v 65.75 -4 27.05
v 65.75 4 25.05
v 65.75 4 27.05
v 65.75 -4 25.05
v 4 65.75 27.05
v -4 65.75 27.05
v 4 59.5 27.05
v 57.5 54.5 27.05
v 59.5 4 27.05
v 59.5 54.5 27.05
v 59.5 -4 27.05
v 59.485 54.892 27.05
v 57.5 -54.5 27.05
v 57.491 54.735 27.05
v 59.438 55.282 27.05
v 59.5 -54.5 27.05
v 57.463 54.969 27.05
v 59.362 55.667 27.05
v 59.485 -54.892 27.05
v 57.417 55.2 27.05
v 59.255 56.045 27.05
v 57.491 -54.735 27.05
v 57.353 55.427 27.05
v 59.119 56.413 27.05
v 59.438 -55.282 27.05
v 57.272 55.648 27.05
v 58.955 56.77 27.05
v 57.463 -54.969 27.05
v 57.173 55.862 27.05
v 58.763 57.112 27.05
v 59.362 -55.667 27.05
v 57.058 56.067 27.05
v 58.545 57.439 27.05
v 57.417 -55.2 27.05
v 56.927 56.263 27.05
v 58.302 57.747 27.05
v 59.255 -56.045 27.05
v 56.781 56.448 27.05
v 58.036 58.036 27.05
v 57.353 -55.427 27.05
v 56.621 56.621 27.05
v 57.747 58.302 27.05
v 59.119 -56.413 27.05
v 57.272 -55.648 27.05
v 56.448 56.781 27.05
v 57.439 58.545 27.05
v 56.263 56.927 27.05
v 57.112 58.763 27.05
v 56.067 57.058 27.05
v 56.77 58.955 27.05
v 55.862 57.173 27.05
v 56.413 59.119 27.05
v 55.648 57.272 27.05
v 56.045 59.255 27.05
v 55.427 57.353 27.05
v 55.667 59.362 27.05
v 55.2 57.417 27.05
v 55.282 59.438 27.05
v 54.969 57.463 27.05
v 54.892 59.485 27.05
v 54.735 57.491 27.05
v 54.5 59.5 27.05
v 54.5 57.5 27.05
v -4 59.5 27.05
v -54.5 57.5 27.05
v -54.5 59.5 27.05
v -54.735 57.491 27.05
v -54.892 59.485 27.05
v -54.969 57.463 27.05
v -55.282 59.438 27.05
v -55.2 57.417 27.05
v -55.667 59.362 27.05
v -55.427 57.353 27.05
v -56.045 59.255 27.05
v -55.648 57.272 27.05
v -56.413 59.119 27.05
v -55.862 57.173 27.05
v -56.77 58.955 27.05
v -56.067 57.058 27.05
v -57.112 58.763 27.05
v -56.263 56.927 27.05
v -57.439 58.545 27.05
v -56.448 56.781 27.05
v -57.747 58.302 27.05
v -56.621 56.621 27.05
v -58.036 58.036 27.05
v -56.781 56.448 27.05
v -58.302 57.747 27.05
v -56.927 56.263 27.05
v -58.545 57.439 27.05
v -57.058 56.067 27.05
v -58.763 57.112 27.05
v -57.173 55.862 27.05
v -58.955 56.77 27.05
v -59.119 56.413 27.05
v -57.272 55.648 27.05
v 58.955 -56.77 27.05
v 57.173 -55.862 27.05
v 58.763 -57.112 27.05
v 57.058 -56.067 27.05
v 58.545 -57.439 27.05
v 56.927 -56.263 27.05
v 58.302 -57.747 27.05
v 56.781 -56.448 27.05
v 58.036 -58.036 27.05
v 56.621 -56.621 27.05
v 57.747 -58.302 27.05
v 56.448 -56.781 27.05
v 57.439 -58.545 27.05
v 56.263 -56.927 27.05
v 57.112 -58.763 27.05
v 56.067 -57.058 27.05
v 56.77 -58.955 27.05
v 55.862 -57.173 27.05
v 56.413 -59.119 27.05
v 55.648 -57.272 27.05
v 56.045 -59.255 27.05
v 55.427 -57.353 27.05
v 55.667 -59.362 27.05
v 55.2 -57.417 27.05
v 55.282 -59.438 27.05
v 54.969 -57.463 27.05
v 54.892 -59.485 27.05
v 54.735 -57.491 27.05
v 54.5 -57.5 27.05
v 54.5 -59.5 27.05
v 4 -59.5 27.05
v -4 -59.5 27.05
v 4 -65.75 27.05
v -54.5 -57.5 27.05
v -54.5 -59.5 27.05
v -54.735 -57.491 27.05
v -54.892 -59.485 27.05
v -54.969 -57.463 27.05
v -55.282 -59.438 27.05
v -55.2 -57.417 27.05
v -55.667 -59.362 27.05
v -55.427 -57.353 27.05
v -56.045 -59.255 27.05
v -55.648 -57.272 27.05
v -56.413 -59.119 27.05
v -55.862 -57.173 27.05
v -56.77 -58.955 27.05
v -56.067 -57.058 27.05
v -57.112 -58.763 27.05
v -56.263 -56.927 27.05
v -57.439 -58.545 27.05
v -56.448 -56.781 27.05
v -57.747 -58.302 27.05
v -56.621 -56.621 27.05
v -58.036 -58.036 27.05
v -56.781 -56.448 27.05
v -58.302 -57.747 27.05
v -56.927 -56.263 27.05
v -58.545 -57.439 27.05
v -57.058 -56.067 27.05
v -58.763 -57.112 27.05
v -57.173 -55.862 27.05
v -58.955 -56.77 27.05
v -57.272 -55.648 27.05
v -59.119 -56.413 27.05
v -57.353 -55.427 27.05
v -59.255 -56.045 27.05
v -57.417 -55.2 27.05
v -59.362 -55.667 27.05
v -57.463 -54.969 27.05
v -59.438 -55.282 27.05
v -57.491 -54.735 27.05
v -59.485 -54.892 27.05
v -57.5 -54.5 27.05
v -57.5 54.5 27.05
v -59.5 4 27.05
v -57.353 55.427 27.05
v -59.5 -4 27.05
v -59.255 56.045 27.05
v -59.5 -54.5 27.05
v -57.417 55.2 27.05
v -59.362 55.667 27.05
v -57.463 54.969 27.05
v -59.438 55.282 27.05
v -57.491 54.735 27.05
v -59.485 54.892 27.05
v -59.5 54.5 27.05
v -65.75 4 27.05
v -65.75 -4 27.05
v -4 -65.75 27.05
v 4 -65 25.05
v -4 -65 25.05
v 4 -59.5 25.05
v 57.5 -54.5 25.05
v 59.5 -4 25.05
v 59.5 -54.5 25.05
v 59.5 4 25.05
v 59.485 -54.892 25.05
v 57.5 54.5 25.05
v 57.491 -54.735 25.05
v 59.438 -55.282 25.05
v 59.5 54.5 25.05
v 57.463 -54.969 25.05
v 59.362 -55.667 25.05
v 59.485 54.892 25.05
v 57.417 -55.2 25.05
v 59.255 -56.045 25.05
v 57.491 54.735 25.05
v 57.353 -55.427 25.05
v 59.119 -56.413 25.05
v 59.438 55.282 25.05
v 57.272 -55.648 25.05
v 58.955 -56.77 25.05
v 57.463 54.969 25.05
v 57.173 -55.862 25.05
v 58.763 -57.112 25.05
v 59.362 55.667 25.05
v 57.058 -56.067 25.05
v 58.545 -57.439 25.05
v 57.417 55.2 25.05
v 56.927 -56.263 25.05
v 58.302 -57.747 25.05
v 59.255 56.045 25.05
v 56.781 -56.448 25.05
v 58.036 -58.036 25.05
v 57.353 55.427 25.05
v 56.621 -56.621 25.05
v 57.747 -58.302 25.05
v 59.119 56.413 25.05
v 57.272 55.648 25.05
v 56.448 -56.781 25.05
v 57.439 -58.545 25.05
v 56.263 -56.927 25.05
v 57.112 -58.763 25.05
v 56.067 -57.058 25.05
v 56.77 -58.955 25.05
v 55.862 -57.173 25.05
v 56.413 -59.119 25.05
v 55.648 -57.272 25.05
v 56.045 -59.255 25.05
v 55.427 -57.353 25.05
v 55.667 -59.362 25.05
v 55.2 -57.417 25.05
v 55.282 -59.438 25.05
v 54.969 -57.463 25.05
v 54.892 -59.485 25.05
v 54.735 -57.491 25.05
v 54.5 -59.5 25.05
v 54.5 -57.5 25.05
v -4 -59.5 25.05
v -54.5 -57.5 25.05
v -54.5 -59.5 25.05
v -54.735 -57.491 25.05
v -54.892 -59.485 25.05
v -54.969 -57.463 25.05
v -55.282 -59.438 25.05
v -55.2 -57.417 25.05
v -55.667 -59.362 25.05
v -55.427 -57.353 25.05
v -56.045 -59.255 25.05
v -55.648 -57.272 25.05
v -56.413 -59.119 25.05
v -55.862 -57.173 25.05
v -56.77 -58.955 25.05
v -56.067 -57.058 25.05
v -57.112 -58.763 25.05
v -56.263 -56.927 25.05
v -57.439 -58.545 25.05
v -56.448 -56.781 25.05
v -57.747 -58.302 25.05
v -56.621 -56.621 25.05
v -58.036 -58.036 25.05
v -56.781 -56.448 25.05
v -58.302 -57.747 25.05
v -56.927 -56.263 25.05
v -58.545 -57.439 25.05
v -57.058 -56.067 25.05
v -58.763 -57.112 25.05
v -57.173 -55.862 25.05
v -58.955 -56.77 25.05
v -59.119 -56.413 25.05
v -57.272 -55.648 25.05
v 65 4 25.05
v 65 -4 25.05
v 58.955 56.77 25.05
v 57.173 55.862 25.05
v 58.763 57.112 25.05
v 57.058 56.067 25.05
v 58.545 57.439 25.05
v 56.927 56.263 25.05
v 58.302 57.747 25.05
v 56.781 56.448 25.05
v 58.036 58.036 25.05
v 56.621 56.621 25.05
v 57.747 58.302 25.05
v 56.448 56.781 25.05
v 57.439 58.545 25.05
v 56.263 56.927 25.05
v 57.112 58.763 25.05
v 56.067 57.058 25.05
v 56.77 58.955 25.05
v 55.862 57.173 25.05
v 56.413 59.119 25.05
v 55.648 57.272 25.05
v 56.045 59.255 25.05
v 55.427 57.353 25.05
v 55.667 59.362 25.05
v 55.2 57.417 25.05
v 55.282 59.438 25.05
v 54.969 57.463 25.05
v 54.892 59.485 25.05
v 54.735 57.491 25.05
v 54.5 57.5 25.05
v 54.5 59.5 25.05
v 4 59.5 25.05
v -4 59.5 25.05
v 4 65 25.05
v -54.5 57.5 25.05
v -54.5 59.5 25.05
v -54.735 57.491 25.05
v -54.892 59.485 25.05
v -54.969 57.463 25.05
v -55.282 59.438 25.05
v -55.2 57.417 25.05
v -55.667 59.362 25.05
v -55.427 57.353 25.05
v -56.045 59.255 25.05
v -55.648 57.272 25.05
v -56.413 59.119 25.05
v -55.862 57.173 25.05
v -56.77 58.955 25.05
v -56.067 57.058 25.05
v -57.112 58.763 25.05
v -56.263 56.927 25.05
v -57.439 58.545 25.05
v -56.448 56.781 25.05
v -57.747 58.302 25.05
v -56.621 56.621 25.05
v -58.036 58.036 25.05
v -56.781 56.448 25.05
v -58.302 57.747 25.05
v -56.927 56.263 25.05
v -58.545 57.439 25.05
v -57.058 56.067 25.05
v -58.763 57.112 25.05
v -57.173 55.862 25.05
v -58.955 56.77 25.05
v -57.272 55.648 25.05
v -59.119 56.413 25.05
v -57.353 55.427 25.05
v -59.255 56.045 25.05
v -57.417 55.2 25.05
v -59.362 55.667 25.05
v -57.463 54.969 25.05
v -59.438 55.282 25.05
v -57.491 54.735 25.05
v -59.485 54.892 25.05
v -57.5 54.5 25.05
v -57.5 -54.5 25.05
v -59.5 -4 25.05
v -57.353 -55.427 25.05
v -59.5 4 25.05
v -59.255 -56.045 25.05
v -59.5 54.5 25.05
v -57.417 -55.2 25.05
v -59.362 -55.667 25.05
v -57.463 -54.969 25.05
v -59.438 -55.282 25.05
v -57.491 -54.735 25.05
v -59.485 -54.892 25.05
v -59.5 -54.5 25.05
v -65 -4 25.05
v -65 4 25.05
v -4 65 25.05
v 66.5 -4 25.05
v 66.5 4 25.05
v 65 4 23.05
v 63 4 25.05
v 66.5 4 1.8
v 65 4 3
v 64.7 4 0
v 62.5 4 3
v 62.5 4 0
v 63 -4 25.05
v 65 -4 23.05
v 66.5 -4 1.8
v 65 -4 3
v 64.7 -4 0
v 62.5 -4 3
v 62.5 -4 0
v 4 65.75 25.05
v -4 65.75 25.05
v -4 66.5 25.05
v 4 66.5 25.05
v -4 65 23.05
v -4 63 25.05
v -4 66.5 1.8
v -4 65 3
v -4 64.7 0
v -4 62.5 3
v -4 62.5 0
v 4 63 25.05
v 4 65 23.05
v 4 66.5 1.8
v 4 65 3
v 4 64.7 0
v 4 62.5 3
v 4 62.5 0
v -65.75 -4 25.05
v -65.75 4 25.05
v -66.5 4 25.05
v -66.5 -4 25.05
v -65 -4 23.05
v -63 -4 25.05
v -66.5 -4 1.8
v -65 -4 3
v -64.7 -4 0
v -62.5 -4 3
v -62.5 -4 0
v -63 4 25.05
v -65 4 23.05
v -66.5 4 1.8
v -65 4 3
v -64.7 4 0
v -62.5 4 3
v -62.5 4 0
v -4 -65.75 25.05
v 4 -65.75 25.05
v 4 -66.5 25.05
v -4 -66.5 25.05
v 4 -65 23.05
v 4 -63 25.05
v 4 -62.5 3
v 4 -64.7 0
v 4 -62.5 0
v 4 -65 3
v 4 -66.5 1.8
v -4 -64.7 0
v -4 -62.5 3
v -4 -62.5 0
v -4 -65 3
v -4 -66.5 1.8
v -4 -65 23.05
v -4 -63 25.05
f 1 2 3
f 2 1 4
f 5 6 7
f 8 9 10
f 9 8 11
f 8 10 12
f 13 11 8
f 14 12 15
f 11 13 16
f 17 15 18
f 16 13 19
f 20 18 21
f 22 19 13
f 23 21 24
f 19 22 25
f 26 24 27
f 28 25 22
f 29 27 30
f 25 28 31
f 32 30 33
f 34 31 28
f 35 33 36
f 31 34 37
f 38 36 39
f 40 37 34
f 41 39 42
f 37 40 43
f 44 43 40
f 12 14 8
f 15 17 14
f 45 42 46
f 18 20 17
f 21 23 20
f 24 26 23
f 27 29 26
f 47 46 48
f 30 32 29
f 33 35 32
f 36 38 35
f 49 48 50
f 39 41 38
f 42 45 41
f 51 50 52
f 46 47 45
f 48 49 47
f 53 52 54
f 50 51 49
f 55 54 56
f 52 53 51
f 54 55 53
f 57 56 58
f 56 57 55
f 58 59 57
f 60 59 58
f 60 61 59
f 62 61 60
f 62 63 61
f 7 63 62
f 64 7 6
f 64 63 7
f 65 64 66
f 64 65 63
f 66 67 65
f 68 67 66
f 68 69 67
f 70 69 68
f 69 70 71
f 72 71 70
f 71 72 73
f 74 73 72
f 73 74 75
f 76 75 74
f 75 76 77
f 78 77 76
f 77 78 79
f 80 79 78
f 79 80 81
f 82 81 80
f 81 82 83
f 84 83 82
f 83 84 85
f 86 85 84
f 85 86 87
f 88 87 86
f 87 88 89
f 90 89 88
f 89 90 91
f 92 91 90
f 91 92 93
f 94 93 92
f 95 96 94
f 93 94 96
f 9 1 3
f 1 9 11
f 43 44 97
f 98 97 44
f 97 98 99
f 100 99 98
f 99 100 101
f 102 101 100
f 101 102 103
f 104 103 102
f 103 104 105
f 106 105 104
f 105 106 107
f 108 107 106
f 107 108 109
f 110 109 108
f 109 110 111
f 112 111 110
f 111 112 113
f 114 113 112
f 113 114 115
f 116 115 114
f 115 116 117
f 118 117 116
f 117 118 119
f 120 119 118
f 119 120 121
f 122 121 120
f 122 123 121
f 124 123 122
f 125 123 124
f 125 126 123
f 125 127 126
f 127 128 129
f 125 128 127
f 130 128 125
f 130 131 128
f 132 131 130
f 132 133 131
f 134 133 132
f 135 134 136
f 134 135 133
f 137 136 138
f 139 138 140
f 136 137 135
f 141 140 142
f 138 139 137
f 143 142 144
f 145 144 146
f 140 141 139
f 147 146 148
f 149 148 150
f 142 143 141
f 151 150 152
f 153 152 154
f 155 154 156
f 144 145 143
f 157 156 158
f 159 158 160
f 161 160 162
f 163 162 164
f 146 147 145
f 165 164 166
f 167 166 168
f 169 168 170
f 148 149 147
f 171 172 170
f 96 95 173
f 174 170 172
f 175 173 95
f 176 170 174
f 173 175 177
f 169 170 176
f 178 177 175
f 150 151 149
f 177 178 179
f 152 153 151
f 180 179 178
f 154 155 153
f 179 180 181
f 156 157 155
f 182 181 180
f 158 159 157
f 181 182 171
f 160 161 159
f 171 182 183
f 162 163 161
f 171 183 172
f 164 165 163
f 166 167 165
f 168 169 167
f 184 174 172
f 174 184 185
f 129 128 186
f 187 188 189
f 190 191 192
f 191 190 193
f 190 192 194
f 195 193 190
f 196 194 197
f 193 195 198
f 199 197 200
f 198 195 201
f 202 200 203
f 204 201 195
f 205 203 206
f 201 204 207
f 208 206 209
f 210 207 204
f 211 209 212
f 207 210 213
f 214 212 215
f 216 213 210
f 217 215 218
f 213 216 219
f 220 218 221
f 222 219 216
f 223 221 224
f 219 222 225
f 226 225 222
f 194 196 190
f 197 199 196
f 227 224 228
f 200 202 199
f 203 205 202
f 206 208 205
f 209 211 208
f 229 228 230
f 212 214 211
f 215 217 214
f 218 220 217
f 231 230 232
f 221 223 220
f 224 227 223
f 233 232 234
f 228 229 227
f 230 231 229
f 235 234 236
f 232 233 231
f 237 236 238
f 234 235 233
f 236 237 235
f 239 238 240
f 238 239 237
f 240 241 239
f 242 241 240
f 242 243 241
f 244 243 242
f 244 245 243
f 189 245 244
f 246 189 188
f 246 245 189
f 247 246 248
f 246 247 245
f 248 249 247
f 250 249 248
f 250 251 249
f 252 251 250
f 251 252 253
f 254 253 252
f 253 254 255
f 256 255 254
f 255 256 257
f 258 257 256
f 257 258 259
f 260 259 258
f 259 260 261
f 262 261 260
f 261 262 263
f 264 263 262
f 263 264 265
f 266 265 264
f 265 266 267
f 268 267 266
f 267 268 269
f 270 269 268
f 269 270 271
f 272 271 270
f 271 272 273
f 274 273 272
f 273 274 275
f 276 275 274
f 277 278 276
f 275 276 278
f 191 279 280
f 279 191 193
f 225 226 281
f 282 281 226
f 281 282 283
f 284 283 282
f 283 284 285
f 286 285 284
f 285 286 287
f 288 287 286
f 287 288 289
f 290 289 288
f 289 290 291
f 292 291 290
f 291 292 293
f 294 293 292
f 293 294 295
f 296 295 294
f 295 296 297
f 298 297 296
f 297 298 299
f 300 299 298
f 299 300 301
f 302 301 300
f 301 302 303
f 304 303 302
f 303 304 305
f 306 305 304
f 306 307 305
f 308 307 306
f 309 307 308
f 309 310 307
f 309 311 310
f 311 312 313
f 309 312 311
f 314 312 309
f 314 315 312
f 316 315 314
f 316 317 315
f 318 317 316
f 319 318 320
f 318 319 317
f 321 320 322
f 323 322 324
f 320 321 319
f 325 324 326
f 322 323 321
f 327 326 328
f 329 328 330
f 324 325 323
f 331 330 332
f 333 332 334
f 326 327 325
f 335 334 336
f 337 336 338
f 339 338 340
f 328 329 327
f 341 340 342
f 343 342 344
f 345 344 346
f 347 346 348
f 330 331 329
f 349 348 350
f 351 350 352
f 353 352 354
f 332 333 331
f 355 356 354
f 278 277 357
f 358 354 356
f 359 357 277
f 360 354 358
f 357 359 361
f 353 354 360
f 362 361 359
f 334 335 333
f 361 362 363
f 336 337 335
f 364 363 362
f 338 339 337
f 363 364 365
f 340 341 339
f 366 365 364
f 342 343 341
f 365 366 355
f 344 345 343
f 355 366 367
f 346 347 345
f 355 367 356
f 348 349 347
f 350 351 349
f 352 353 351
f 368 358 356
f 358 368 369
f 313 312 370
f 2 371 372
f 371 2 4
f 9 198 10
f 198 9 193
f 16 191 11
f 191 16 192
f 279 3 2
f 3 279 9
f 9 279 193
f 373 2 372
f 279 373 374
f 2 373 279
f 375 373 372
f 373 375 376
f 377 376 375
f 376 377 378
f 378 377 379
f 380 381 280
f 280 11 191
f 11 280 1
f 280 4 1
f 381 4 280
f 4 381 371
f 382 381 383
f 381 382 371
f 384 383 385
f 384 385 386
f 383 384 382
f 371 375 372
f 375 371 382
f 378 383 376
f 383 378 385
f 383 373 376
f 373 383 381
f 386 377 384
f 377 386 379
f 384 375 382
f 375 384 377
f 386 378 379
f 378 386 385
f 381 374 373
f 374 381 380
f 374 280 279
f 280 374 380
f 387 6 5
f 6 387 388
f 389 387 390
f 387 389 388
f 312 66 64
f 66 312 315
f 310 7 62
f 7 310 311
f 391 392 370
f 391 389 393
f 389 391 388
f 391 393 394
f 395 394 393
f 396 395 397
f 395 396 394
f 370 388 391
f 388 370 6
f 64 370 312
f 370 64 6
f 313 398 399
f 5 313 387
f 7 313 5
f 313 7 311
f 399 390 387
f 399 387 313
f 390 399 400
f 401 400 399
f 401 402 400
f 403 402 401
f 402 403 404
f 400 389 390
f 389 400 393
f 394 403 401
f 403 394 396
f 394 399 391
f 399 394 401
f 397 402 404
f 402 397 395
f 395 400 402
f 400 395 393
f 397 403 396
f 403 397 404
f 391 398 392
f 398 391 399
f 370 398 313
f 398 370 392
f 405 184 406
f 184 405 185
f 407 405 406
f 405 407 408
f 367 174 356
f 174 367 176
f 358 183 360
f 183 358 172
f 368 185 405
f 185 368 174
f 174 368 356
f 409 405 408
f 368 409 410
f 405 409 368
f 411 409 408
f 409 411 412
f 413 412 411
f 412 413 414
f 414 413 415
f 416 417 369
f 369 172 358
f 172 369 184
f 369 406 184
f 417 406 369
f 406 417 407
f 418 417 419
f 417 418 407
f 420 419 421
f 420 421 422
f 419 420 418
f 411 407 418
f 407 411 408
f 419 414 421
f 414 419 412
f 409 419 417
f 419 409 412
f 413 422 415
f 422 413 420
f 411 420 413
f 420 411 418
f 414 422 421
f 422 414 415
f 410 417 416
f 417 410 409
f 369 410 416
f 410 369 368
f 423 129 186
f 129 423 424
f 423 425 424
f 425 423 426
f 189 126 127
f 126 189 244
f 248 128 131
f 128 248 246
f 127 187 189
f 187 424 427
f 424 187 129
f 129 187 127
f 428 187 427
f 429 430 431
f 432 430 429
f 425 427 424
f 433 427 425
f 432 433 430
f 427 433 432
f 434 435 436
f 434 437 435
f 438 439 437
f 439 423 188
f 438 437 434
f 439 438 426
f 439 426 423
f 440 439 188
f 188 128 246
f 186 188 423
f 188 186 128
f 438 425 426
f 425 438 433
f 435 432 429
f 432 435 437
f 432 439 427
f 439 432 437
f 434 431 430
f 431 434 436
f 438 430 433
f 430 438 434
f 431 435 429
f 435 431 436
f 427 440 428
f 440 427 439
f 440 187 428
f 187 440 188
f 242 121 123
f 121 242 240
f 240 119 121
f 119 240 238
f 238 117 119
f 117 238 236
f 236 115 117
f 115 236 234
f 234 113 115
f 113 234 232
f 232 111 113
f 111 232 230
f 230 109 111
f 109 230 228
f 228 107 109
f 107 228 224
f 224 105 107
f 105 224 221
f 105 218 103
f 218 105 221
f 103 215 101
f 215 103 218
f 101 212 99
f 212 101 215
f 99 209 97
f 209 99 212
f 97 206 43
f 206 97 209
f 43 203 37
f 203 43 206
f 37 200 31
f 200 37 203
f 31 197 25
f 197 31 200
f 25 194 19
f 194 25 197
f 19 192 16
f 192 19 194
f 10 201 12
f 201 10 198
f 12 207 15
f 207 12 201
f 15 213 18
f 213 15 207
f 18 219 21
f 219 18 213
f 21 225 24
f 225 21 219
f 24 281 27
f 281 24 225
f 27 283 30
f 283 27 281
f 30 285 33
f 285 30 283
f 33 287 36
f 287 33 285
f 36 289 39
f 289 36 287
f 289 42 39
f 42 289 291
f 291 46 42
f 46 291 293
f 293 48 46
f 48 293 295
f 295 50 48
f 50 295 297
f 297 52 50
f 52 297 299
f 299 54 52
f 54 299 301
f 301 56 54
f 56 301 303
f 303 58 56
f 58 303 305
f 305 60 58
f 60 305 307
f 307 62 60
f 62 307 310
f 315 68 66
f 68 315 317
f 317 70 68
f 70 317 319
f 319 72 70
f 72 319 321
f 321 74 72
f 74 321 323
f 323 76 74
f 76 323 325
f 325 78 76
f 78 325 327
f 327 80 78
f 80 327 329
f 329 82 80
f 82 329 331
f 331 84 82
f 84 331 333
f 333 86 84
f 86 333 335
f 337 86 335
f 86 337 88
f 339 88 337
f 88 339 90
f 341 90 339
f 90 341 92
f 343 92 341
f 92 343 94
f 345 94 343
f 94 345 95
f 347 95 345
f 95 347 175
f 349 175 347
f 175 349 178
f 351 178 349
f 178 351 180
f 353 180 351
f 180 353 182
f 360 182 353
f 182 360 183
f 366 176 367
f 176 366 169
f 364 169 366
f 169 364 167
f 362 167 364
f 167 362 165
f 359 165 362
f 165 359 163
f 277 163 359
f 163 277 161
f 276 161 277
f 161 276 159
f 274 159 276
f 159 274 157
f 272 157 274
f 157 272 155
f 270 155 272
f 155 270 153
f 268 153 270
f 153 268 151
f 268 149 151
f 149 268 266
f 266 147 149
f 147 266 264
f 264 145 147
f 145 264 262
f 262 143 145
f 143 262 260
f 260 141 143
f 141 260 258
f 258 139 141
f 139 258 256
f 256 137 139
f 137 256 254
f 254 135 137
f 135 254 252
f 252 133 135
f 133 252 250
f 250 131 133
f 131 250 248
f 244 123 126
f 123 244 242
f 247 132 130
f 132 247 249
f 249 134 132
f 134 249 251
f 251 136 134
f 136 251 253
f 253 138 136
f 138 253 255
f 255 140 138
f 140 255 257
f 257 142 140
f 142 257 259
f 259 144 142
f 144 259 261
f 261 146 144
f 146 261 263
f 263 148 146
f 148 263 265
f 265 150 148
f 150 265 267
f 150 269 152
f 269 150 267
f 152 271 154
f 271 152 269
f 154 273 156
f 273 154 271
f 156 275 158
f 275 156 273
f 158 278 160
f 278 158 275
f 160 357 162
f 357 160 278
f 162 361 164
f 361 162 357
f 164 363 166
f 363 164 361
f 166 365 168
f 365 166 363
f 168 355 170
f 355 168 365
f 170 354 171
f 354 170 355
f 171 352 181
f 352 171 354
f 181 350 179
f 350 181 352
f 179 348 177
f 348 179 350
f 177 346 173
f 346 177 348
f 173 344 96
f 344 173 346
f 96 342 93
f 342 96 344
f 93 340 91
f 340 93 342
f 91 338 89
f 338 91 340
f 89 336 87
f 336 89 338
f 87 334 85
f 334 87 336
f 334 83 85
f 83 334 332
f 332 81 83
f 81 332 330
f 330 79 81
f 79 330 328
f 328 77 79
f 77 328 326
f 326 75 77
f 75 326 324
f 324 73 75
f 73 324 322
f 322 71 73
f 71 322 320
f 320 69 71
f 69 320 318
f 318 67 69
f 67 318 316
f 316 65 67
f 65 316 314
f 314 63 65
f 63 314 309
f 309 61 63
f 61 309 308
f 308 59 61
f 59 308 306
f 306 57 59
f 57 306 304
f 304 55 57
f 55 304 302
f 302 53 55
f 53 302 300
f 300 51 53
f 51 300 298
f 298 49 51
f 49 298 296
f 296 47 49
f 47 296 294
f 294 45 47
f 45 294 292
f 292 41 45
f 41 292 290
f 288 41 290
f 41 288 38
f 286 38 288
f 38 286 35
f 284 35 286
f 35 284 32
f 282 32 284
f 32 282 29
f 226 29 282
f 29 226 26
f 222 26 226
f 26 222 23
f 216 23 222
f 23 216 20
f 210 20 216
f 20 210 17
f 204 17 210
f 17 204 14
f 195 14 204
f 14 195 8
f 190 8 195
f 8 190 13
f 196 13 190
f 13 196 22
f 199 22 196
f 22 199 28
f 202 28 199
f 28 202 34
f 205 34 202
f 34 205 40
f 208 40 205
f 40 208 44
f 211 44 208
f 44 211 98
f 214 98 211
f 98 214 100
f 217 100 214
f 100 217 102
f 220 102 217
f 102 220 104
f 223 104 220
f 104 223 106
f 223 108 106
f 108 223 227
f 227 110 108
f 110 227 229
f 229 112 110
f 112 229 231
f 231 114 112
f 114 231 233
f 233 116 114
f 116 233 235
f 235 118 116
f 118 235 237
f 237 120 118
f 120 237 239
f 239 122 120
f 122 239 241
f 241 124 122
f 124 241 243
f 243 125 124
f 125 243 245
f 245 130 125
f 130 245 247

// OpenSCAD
// file: fan-tub-adapter-params.scad
// Fan-Tub Adapter v2.0 — Shared Parameters
// Used by both base plate and retention clip designs.

// === Waffle Grid Measurements ===
square_size   = 63.7;    // mm — waffle square (channel edge to channel edge)
channel_w     = 9.4;     // mm — channel width between adjacent squares
waffle_h      = 4.6;     // mm — waffle square height above channel surface

// === Cutout ===
cutout        = 2 * square_size + channel_w;  // 136.8mm

// === Frame Plate ===
frame_t_inner = 5.0;     // mm — inner zone thickness (fan mount)
frame_t_outer = waffle_h; // mm — outer zone (flange + branches, flush with waffle tops)
corner_r      = 4;       // mm — waffle square corner radius

// === Flange ===
flange_w      = channel_w / 2;  // 4.7mm

// === Fan Geometry ===
fan_frame     = 119;     // mm — fan outer dimension (square)
fan_frame_t   = 24.7;    // mm — fan frame thickness (measured)
fan_opening   = 115;     // mm — center airflow diameter (matches fan inner circle)
fan_corner_r  = 5;       // mm — fan frame corner radius

// === Locating Rim ===
loc_rim_h     = 4.0;     // mm — height of rim above inner plate (was 1.5 in v1)
loc_rim_wall  = 2;       // mm — rim wall thickness
loc_clearance = 0.5;     // mm — clearance around fan frame (per side)

// === Y-Branch Geometry ===
branch_w      = 9.0;     // mm — branch width (9.4 channel - 0.4 clearance)
branch_len    = 25;      // mm — engagement length into channel from root

// === Clip Mechanism ===
// Ledge on rim exterior: chamfered underside for printability.
//   Bottom zone: 45° chamfer ramps from 0 to full depth over clip_ledge_depth height.
//   Top zone:    flat engagement face, clip_ledge_flat mm tall — hook catches here.
//   Total ledge height = clip_ledge_depth (chamfer) + clip_ledge_flat (flat).
clip_ledge_depth   = 3.0;  // mm — outward protrusion; also sets chamfer height (45°)
clip_ledge_flat    = 2.0;  // mm — flat engagement zone at ledge top (hook catches here)
clip_ledge_h       = clip_ledge_depth + clip_ledge_flat;  // 5.0mm total ledge height
clip_arm_w         = 8.0;  // mm — arm width
clip_arm_t         = 1.5;  // mm — arm thickness
clip_arm_len       = 22.05; // mm — arm length (preload-adjusted)
clip_hook_overhang = 2.5;  // mm — hook inward protrusion (snap deflection + engagement)
clip_hook_h        = 3.0;  // mm — hook height
clip_frame_t       = 2.0;  // mm — clip frame thickness
clip_tab_w         = 3.5;  // mm — outward bridge from frame edge to arm

// === Derived Values ===
frame_outer   = cutout + 2 * flange_w;        // 146.2mm
branch_root   = cutout / 2 + channel_w / 2;   // 73.1mm

loc_inner     = fan_frame + 2 * loc_clearance; // 120mm
loc_outer     = loc_inner + 2 * loc_rim_wall;  // 124mm

// Vertical stackup (Z from base plate bottom)
z_inner_top   = frame_t_inner;                 // 5.0
z_rim_top     = frame_t_inner + loc_rim_h;     // 9.0
z_ledge_bot   = z_rim_top - clip_ledge_h;      // 7.5 (ledge bottom, 1.5mm from rim top)
z_fan_top     = frame_t_inner + fan_frame_t;   // 29.7
z_clip_top    = z_fan_top + clip_frame_t;      // 31.7

// Bounding boxes
base_bbox_x   = 2 * (branch_root + branch_len); // 196.2
base_bbox_y   = base_bbox_x;
base_bbox_z   = z_rim_top;                       // 9.0
// file: bambu-x1c.scad
// Bambu Lab X1 Carbon — build volume and dimension reporting

BED_X = 256;
BED_Y = 256;
BED_Z = 256;

// Assert a part fits within the build volume.
// Call with the bounding box dimensions of your part.
module assert_fits(x, y, z) {
  assert(x <= BED_X, str("Part X (", x, "mm) exceeds bed X (", BED_X, "mm)"));
  assert(y <= BED_Y, str("Part Y (", y, "mm) exceeds bed Y (", BED_Y, "mm)"));
  assert(z <= BED_Z, str("Part Z (", z, "mm) exceeds bed Z (", BED_Z, "mm)"));
}

// Echo dimensions in a parseable format for the Node.js pipeline.
// Call at the end of your .scad file with the part's bounding box.
module report_dimensions(x, y, z, label="part") {
  assert_fits(x, y, z);
  echo(str("DIMENSION:", label, ":x=", x));
  echo(str("DIMENSION:", label, ":y=", y));
  echo(str("DIMENSION:", label, ":z=", z));
}
// file: fdm-pla.scad
// FDM PLA Tolerance Constants
// Use these in all designs to ensure proper fit on the Bambu X1C.

// Fit offsets (applied to radius or per-side dimension)
FDM_PRESS_FIT     = -0.15;  // Friction-held joints
FDM_CLEARANCE_FIT =  0.25;  // Easy insert/remove
FDM_SLIDING_FIT   =  0.35;  // Moving parts

// Hole compensation (applied to diameter)
FDM_HOLE_COMPENSATION = 0.4;

// Structural minimums
MIN_WALL = 1.2;       // 3 perimeters at 0.4mm nozzle
MIN_FLOOR_CEIL = 0.8; // 4 layers at 0.2mm

// Overhang and bridging limits
MAX_OVERHANG_ANGLE = 45;  // degrees from vertical
MAX_BRIDGE_SPAN    = 10;  // mm unsupported horizontal span

// Layer and nozzle
NOZZLE_DIA   = 0.4;
LAYER_HEIGHT = 0.2;
// main file
// Fan-Tub Adapter v2.0 — Retention Clip
// Snaps onto base plate ledges to hold fan in place.
// Modeled in INSTALLED orientation (frame on top, arms hanging down).
// Flip upside-down for printing (frame on bed, arms up).
//
// Snap-fit mechanics (Bambu PLA Basic):
//   Nominal root stress: σ = 3Ehδ/2L² = 29 MPa  (E=3500, h=1.5, δ=1.8, L=22.05)
//   Sharp-corner Kt ≈ 2.5  →  σ_peak ≈ 73 MPa ≈ yield  →  low cycle life
//   2mm root fillet:   Kt ≈ 1.2  →  σ_peak ≈ 35 MPa  →  good for repeated cycling

include <fdm-pla.scad>
include <bambu-x1c.scad>
include <fan-tub-adapter-params.scad>

$fn = 80;

// === Clip geometry ===

clip_frame_outer = fan_frame;      // 119mm — matches fan frame outer
clip_frame_inner = fan_opening;    // 105mm — center airflow opening
clip_frame_r     = fan_corner_r;   // 5mm corner radius

// Arm center offset: arm sits just outside the rim ledge
arm_center_offset = loc_outer / 2 + clip_ledge_depth + clip_arm_t / 2;  // 62 + 1.0 + 0.75 = 63.75

// Tab bridge from frame edge to arm center
tab_len = arm_center_offset - clip_frame_outer / 2;  // 63.75 - 59.5 = 4.25mm

// Local Z coordinate system (installed orientation):
//   z = 0              hook bottom  (global: z_fan_top - clip_arm_len - clip_hook_h = 6.15)
//   z = clip_hook_h    arm/hook boundary                                              (1.5)
//   z = local_arm_top  arm top / frame bottom                                        (23.55)
//   z = total_clip_h   frame top                                                     (25.55)
local_arm_bot   = clip_hook_h;                   // 1.5
local_arm_top   = clip_hook_h + clip_arm_len;    // 23.55
local_frame_bot = local_arm_top;                 // 23.55
local_frame_top = local_arm_top + clip_frame_t;  // 25.55
total_clip_h    = local_frame_top;               // 25.55

// Hook entry chamfer — 45° ramp on outer-lower face for smooth snap-in
hook_chamfer = min(clip_hook_overhang, clip_hook_h * 0.6);  // 0.8mm

// Root fillet radius — reduces Kt at arm bending root
fillet_r = 2.0;

// Clip XY bounding box
clip_bbox_xy = loc_outer + 2 * clip_ledge_depth + 2 * clip_arm_t;  // 129mm

report_dimensions(clip_bbox_xy, clip_bbox_xy, total_clip_h, "clip");


// === Modules ===

module rounded_square_2d(size, r) {
    offset(r=r) offset(r=-r) square(size, center=true);
}

// Clip frame — sits on top of fan
module clip_frame() {
    translate([0, 0, local_frame_bot])
        linear_extrude(clip_frame_t)
            difference() {
                rounded_square_2d(clip_frame_outer, clip_frame_r);
                rounded_square_2d(clip_frame_inner, clip_frame_r - 2);
            }
}

// Single arm assembly: tab + arm + hook + root fillet
// side: 0=+X, 1=+Y, 2=-X, 3=-Y
//
// Hook geometry (XZ cross-section):
//
//   x_hook_inner          x_arm_inner  x_arm_outer
//        |                     |            |
//   z=1.5 ├─────────────────────┤────────────┤  (arm bottom / hook top)
//        │                                  │
//   z=0.8 │                              ╱  │  ← 45° chamfer on entry face
//   z=0   ╰────────────────────────────╱    │  (hook bottom)
//
// Chamfer guides the arm outward smoothly during snap-in rather than blunt impact.
//
// Root fillet geometry:
//   Triangular prism in the concave corner between arm inner face and tab underside.
//   Kt reduced from ~2.5 (sharp) to ~1.2 (2mm fillet) — critical for cycle life.
//
module clip_arm(side) {
    angle = side * 90;

    x_arm_inner  = arm_center_offset - clip_arm_t / 2;  // 63.0
    x_arm_outer  = arm_center_offset + clip_arm_t / 2;  // 64.5
    x_hook_inner = x_arm_inner - clip_hook_overhang;    // 62.2

    rotate([0, 0, angle]) {

        // Tab: horizontal bridge from frame edge to arm
        translate([clip_frame_outer/2, -clip_arm_w/2, local_frame_bot])
            cube([tab_len, clip_arm_w, clip_frame_t]);

        // Arm: vertical column
        translate([x_arm_inner, -clip_arm_w/2, local_arm_bot])
            cube([clip_arm_t, clip_arm_w, local_arm_top - local_arm_bot]);

        // Hook: inward overhang with 45° lead-in on outer-lower entry edge.
        // Profile defined in XZ space, extruded along Y (arm width).
        // rotate([90,0,0]) maps the polygon's XY into world XZ.
        rotate([90, 0, 0])
            linear_extrude(clip_arm_w, center=true)
                polygon([
                    [x_hook_inner,              0             ],  // inner bottom
                    [x_arm_outer - hook_chamfer, 0             ],  // outer bottom (chamfer start)
                    [x_arm_outer,               hook_chamfer  ],  // chamfer apex
                    [x_arm_outer,               clip_hook_h   ],  // outer top
                    [x_hook_inner,              clip_hook_h   ],  // inner top
                ]);

        // Root fillet: triangular prism filling the concave corner between
        // arm inner face (x = x_arm_inner) and tab underside (z = local_frame_bot).
        rotate([90, 0, 0])
            linear_extrude(clip_arm_w, center=true)
                polygon([
                    [x_arm_inner,          local_frame_bot        ],
                    [x_arm_inner - fillet_r, local_frame_bot      ],
                    [x_arm_inner,          local_frame_bot - fillet_r],
                ]);

    }
}


// === Assembly ===

union() {
    clip_frame();
    for (side = [0:3]) clip_arm(side);
}
